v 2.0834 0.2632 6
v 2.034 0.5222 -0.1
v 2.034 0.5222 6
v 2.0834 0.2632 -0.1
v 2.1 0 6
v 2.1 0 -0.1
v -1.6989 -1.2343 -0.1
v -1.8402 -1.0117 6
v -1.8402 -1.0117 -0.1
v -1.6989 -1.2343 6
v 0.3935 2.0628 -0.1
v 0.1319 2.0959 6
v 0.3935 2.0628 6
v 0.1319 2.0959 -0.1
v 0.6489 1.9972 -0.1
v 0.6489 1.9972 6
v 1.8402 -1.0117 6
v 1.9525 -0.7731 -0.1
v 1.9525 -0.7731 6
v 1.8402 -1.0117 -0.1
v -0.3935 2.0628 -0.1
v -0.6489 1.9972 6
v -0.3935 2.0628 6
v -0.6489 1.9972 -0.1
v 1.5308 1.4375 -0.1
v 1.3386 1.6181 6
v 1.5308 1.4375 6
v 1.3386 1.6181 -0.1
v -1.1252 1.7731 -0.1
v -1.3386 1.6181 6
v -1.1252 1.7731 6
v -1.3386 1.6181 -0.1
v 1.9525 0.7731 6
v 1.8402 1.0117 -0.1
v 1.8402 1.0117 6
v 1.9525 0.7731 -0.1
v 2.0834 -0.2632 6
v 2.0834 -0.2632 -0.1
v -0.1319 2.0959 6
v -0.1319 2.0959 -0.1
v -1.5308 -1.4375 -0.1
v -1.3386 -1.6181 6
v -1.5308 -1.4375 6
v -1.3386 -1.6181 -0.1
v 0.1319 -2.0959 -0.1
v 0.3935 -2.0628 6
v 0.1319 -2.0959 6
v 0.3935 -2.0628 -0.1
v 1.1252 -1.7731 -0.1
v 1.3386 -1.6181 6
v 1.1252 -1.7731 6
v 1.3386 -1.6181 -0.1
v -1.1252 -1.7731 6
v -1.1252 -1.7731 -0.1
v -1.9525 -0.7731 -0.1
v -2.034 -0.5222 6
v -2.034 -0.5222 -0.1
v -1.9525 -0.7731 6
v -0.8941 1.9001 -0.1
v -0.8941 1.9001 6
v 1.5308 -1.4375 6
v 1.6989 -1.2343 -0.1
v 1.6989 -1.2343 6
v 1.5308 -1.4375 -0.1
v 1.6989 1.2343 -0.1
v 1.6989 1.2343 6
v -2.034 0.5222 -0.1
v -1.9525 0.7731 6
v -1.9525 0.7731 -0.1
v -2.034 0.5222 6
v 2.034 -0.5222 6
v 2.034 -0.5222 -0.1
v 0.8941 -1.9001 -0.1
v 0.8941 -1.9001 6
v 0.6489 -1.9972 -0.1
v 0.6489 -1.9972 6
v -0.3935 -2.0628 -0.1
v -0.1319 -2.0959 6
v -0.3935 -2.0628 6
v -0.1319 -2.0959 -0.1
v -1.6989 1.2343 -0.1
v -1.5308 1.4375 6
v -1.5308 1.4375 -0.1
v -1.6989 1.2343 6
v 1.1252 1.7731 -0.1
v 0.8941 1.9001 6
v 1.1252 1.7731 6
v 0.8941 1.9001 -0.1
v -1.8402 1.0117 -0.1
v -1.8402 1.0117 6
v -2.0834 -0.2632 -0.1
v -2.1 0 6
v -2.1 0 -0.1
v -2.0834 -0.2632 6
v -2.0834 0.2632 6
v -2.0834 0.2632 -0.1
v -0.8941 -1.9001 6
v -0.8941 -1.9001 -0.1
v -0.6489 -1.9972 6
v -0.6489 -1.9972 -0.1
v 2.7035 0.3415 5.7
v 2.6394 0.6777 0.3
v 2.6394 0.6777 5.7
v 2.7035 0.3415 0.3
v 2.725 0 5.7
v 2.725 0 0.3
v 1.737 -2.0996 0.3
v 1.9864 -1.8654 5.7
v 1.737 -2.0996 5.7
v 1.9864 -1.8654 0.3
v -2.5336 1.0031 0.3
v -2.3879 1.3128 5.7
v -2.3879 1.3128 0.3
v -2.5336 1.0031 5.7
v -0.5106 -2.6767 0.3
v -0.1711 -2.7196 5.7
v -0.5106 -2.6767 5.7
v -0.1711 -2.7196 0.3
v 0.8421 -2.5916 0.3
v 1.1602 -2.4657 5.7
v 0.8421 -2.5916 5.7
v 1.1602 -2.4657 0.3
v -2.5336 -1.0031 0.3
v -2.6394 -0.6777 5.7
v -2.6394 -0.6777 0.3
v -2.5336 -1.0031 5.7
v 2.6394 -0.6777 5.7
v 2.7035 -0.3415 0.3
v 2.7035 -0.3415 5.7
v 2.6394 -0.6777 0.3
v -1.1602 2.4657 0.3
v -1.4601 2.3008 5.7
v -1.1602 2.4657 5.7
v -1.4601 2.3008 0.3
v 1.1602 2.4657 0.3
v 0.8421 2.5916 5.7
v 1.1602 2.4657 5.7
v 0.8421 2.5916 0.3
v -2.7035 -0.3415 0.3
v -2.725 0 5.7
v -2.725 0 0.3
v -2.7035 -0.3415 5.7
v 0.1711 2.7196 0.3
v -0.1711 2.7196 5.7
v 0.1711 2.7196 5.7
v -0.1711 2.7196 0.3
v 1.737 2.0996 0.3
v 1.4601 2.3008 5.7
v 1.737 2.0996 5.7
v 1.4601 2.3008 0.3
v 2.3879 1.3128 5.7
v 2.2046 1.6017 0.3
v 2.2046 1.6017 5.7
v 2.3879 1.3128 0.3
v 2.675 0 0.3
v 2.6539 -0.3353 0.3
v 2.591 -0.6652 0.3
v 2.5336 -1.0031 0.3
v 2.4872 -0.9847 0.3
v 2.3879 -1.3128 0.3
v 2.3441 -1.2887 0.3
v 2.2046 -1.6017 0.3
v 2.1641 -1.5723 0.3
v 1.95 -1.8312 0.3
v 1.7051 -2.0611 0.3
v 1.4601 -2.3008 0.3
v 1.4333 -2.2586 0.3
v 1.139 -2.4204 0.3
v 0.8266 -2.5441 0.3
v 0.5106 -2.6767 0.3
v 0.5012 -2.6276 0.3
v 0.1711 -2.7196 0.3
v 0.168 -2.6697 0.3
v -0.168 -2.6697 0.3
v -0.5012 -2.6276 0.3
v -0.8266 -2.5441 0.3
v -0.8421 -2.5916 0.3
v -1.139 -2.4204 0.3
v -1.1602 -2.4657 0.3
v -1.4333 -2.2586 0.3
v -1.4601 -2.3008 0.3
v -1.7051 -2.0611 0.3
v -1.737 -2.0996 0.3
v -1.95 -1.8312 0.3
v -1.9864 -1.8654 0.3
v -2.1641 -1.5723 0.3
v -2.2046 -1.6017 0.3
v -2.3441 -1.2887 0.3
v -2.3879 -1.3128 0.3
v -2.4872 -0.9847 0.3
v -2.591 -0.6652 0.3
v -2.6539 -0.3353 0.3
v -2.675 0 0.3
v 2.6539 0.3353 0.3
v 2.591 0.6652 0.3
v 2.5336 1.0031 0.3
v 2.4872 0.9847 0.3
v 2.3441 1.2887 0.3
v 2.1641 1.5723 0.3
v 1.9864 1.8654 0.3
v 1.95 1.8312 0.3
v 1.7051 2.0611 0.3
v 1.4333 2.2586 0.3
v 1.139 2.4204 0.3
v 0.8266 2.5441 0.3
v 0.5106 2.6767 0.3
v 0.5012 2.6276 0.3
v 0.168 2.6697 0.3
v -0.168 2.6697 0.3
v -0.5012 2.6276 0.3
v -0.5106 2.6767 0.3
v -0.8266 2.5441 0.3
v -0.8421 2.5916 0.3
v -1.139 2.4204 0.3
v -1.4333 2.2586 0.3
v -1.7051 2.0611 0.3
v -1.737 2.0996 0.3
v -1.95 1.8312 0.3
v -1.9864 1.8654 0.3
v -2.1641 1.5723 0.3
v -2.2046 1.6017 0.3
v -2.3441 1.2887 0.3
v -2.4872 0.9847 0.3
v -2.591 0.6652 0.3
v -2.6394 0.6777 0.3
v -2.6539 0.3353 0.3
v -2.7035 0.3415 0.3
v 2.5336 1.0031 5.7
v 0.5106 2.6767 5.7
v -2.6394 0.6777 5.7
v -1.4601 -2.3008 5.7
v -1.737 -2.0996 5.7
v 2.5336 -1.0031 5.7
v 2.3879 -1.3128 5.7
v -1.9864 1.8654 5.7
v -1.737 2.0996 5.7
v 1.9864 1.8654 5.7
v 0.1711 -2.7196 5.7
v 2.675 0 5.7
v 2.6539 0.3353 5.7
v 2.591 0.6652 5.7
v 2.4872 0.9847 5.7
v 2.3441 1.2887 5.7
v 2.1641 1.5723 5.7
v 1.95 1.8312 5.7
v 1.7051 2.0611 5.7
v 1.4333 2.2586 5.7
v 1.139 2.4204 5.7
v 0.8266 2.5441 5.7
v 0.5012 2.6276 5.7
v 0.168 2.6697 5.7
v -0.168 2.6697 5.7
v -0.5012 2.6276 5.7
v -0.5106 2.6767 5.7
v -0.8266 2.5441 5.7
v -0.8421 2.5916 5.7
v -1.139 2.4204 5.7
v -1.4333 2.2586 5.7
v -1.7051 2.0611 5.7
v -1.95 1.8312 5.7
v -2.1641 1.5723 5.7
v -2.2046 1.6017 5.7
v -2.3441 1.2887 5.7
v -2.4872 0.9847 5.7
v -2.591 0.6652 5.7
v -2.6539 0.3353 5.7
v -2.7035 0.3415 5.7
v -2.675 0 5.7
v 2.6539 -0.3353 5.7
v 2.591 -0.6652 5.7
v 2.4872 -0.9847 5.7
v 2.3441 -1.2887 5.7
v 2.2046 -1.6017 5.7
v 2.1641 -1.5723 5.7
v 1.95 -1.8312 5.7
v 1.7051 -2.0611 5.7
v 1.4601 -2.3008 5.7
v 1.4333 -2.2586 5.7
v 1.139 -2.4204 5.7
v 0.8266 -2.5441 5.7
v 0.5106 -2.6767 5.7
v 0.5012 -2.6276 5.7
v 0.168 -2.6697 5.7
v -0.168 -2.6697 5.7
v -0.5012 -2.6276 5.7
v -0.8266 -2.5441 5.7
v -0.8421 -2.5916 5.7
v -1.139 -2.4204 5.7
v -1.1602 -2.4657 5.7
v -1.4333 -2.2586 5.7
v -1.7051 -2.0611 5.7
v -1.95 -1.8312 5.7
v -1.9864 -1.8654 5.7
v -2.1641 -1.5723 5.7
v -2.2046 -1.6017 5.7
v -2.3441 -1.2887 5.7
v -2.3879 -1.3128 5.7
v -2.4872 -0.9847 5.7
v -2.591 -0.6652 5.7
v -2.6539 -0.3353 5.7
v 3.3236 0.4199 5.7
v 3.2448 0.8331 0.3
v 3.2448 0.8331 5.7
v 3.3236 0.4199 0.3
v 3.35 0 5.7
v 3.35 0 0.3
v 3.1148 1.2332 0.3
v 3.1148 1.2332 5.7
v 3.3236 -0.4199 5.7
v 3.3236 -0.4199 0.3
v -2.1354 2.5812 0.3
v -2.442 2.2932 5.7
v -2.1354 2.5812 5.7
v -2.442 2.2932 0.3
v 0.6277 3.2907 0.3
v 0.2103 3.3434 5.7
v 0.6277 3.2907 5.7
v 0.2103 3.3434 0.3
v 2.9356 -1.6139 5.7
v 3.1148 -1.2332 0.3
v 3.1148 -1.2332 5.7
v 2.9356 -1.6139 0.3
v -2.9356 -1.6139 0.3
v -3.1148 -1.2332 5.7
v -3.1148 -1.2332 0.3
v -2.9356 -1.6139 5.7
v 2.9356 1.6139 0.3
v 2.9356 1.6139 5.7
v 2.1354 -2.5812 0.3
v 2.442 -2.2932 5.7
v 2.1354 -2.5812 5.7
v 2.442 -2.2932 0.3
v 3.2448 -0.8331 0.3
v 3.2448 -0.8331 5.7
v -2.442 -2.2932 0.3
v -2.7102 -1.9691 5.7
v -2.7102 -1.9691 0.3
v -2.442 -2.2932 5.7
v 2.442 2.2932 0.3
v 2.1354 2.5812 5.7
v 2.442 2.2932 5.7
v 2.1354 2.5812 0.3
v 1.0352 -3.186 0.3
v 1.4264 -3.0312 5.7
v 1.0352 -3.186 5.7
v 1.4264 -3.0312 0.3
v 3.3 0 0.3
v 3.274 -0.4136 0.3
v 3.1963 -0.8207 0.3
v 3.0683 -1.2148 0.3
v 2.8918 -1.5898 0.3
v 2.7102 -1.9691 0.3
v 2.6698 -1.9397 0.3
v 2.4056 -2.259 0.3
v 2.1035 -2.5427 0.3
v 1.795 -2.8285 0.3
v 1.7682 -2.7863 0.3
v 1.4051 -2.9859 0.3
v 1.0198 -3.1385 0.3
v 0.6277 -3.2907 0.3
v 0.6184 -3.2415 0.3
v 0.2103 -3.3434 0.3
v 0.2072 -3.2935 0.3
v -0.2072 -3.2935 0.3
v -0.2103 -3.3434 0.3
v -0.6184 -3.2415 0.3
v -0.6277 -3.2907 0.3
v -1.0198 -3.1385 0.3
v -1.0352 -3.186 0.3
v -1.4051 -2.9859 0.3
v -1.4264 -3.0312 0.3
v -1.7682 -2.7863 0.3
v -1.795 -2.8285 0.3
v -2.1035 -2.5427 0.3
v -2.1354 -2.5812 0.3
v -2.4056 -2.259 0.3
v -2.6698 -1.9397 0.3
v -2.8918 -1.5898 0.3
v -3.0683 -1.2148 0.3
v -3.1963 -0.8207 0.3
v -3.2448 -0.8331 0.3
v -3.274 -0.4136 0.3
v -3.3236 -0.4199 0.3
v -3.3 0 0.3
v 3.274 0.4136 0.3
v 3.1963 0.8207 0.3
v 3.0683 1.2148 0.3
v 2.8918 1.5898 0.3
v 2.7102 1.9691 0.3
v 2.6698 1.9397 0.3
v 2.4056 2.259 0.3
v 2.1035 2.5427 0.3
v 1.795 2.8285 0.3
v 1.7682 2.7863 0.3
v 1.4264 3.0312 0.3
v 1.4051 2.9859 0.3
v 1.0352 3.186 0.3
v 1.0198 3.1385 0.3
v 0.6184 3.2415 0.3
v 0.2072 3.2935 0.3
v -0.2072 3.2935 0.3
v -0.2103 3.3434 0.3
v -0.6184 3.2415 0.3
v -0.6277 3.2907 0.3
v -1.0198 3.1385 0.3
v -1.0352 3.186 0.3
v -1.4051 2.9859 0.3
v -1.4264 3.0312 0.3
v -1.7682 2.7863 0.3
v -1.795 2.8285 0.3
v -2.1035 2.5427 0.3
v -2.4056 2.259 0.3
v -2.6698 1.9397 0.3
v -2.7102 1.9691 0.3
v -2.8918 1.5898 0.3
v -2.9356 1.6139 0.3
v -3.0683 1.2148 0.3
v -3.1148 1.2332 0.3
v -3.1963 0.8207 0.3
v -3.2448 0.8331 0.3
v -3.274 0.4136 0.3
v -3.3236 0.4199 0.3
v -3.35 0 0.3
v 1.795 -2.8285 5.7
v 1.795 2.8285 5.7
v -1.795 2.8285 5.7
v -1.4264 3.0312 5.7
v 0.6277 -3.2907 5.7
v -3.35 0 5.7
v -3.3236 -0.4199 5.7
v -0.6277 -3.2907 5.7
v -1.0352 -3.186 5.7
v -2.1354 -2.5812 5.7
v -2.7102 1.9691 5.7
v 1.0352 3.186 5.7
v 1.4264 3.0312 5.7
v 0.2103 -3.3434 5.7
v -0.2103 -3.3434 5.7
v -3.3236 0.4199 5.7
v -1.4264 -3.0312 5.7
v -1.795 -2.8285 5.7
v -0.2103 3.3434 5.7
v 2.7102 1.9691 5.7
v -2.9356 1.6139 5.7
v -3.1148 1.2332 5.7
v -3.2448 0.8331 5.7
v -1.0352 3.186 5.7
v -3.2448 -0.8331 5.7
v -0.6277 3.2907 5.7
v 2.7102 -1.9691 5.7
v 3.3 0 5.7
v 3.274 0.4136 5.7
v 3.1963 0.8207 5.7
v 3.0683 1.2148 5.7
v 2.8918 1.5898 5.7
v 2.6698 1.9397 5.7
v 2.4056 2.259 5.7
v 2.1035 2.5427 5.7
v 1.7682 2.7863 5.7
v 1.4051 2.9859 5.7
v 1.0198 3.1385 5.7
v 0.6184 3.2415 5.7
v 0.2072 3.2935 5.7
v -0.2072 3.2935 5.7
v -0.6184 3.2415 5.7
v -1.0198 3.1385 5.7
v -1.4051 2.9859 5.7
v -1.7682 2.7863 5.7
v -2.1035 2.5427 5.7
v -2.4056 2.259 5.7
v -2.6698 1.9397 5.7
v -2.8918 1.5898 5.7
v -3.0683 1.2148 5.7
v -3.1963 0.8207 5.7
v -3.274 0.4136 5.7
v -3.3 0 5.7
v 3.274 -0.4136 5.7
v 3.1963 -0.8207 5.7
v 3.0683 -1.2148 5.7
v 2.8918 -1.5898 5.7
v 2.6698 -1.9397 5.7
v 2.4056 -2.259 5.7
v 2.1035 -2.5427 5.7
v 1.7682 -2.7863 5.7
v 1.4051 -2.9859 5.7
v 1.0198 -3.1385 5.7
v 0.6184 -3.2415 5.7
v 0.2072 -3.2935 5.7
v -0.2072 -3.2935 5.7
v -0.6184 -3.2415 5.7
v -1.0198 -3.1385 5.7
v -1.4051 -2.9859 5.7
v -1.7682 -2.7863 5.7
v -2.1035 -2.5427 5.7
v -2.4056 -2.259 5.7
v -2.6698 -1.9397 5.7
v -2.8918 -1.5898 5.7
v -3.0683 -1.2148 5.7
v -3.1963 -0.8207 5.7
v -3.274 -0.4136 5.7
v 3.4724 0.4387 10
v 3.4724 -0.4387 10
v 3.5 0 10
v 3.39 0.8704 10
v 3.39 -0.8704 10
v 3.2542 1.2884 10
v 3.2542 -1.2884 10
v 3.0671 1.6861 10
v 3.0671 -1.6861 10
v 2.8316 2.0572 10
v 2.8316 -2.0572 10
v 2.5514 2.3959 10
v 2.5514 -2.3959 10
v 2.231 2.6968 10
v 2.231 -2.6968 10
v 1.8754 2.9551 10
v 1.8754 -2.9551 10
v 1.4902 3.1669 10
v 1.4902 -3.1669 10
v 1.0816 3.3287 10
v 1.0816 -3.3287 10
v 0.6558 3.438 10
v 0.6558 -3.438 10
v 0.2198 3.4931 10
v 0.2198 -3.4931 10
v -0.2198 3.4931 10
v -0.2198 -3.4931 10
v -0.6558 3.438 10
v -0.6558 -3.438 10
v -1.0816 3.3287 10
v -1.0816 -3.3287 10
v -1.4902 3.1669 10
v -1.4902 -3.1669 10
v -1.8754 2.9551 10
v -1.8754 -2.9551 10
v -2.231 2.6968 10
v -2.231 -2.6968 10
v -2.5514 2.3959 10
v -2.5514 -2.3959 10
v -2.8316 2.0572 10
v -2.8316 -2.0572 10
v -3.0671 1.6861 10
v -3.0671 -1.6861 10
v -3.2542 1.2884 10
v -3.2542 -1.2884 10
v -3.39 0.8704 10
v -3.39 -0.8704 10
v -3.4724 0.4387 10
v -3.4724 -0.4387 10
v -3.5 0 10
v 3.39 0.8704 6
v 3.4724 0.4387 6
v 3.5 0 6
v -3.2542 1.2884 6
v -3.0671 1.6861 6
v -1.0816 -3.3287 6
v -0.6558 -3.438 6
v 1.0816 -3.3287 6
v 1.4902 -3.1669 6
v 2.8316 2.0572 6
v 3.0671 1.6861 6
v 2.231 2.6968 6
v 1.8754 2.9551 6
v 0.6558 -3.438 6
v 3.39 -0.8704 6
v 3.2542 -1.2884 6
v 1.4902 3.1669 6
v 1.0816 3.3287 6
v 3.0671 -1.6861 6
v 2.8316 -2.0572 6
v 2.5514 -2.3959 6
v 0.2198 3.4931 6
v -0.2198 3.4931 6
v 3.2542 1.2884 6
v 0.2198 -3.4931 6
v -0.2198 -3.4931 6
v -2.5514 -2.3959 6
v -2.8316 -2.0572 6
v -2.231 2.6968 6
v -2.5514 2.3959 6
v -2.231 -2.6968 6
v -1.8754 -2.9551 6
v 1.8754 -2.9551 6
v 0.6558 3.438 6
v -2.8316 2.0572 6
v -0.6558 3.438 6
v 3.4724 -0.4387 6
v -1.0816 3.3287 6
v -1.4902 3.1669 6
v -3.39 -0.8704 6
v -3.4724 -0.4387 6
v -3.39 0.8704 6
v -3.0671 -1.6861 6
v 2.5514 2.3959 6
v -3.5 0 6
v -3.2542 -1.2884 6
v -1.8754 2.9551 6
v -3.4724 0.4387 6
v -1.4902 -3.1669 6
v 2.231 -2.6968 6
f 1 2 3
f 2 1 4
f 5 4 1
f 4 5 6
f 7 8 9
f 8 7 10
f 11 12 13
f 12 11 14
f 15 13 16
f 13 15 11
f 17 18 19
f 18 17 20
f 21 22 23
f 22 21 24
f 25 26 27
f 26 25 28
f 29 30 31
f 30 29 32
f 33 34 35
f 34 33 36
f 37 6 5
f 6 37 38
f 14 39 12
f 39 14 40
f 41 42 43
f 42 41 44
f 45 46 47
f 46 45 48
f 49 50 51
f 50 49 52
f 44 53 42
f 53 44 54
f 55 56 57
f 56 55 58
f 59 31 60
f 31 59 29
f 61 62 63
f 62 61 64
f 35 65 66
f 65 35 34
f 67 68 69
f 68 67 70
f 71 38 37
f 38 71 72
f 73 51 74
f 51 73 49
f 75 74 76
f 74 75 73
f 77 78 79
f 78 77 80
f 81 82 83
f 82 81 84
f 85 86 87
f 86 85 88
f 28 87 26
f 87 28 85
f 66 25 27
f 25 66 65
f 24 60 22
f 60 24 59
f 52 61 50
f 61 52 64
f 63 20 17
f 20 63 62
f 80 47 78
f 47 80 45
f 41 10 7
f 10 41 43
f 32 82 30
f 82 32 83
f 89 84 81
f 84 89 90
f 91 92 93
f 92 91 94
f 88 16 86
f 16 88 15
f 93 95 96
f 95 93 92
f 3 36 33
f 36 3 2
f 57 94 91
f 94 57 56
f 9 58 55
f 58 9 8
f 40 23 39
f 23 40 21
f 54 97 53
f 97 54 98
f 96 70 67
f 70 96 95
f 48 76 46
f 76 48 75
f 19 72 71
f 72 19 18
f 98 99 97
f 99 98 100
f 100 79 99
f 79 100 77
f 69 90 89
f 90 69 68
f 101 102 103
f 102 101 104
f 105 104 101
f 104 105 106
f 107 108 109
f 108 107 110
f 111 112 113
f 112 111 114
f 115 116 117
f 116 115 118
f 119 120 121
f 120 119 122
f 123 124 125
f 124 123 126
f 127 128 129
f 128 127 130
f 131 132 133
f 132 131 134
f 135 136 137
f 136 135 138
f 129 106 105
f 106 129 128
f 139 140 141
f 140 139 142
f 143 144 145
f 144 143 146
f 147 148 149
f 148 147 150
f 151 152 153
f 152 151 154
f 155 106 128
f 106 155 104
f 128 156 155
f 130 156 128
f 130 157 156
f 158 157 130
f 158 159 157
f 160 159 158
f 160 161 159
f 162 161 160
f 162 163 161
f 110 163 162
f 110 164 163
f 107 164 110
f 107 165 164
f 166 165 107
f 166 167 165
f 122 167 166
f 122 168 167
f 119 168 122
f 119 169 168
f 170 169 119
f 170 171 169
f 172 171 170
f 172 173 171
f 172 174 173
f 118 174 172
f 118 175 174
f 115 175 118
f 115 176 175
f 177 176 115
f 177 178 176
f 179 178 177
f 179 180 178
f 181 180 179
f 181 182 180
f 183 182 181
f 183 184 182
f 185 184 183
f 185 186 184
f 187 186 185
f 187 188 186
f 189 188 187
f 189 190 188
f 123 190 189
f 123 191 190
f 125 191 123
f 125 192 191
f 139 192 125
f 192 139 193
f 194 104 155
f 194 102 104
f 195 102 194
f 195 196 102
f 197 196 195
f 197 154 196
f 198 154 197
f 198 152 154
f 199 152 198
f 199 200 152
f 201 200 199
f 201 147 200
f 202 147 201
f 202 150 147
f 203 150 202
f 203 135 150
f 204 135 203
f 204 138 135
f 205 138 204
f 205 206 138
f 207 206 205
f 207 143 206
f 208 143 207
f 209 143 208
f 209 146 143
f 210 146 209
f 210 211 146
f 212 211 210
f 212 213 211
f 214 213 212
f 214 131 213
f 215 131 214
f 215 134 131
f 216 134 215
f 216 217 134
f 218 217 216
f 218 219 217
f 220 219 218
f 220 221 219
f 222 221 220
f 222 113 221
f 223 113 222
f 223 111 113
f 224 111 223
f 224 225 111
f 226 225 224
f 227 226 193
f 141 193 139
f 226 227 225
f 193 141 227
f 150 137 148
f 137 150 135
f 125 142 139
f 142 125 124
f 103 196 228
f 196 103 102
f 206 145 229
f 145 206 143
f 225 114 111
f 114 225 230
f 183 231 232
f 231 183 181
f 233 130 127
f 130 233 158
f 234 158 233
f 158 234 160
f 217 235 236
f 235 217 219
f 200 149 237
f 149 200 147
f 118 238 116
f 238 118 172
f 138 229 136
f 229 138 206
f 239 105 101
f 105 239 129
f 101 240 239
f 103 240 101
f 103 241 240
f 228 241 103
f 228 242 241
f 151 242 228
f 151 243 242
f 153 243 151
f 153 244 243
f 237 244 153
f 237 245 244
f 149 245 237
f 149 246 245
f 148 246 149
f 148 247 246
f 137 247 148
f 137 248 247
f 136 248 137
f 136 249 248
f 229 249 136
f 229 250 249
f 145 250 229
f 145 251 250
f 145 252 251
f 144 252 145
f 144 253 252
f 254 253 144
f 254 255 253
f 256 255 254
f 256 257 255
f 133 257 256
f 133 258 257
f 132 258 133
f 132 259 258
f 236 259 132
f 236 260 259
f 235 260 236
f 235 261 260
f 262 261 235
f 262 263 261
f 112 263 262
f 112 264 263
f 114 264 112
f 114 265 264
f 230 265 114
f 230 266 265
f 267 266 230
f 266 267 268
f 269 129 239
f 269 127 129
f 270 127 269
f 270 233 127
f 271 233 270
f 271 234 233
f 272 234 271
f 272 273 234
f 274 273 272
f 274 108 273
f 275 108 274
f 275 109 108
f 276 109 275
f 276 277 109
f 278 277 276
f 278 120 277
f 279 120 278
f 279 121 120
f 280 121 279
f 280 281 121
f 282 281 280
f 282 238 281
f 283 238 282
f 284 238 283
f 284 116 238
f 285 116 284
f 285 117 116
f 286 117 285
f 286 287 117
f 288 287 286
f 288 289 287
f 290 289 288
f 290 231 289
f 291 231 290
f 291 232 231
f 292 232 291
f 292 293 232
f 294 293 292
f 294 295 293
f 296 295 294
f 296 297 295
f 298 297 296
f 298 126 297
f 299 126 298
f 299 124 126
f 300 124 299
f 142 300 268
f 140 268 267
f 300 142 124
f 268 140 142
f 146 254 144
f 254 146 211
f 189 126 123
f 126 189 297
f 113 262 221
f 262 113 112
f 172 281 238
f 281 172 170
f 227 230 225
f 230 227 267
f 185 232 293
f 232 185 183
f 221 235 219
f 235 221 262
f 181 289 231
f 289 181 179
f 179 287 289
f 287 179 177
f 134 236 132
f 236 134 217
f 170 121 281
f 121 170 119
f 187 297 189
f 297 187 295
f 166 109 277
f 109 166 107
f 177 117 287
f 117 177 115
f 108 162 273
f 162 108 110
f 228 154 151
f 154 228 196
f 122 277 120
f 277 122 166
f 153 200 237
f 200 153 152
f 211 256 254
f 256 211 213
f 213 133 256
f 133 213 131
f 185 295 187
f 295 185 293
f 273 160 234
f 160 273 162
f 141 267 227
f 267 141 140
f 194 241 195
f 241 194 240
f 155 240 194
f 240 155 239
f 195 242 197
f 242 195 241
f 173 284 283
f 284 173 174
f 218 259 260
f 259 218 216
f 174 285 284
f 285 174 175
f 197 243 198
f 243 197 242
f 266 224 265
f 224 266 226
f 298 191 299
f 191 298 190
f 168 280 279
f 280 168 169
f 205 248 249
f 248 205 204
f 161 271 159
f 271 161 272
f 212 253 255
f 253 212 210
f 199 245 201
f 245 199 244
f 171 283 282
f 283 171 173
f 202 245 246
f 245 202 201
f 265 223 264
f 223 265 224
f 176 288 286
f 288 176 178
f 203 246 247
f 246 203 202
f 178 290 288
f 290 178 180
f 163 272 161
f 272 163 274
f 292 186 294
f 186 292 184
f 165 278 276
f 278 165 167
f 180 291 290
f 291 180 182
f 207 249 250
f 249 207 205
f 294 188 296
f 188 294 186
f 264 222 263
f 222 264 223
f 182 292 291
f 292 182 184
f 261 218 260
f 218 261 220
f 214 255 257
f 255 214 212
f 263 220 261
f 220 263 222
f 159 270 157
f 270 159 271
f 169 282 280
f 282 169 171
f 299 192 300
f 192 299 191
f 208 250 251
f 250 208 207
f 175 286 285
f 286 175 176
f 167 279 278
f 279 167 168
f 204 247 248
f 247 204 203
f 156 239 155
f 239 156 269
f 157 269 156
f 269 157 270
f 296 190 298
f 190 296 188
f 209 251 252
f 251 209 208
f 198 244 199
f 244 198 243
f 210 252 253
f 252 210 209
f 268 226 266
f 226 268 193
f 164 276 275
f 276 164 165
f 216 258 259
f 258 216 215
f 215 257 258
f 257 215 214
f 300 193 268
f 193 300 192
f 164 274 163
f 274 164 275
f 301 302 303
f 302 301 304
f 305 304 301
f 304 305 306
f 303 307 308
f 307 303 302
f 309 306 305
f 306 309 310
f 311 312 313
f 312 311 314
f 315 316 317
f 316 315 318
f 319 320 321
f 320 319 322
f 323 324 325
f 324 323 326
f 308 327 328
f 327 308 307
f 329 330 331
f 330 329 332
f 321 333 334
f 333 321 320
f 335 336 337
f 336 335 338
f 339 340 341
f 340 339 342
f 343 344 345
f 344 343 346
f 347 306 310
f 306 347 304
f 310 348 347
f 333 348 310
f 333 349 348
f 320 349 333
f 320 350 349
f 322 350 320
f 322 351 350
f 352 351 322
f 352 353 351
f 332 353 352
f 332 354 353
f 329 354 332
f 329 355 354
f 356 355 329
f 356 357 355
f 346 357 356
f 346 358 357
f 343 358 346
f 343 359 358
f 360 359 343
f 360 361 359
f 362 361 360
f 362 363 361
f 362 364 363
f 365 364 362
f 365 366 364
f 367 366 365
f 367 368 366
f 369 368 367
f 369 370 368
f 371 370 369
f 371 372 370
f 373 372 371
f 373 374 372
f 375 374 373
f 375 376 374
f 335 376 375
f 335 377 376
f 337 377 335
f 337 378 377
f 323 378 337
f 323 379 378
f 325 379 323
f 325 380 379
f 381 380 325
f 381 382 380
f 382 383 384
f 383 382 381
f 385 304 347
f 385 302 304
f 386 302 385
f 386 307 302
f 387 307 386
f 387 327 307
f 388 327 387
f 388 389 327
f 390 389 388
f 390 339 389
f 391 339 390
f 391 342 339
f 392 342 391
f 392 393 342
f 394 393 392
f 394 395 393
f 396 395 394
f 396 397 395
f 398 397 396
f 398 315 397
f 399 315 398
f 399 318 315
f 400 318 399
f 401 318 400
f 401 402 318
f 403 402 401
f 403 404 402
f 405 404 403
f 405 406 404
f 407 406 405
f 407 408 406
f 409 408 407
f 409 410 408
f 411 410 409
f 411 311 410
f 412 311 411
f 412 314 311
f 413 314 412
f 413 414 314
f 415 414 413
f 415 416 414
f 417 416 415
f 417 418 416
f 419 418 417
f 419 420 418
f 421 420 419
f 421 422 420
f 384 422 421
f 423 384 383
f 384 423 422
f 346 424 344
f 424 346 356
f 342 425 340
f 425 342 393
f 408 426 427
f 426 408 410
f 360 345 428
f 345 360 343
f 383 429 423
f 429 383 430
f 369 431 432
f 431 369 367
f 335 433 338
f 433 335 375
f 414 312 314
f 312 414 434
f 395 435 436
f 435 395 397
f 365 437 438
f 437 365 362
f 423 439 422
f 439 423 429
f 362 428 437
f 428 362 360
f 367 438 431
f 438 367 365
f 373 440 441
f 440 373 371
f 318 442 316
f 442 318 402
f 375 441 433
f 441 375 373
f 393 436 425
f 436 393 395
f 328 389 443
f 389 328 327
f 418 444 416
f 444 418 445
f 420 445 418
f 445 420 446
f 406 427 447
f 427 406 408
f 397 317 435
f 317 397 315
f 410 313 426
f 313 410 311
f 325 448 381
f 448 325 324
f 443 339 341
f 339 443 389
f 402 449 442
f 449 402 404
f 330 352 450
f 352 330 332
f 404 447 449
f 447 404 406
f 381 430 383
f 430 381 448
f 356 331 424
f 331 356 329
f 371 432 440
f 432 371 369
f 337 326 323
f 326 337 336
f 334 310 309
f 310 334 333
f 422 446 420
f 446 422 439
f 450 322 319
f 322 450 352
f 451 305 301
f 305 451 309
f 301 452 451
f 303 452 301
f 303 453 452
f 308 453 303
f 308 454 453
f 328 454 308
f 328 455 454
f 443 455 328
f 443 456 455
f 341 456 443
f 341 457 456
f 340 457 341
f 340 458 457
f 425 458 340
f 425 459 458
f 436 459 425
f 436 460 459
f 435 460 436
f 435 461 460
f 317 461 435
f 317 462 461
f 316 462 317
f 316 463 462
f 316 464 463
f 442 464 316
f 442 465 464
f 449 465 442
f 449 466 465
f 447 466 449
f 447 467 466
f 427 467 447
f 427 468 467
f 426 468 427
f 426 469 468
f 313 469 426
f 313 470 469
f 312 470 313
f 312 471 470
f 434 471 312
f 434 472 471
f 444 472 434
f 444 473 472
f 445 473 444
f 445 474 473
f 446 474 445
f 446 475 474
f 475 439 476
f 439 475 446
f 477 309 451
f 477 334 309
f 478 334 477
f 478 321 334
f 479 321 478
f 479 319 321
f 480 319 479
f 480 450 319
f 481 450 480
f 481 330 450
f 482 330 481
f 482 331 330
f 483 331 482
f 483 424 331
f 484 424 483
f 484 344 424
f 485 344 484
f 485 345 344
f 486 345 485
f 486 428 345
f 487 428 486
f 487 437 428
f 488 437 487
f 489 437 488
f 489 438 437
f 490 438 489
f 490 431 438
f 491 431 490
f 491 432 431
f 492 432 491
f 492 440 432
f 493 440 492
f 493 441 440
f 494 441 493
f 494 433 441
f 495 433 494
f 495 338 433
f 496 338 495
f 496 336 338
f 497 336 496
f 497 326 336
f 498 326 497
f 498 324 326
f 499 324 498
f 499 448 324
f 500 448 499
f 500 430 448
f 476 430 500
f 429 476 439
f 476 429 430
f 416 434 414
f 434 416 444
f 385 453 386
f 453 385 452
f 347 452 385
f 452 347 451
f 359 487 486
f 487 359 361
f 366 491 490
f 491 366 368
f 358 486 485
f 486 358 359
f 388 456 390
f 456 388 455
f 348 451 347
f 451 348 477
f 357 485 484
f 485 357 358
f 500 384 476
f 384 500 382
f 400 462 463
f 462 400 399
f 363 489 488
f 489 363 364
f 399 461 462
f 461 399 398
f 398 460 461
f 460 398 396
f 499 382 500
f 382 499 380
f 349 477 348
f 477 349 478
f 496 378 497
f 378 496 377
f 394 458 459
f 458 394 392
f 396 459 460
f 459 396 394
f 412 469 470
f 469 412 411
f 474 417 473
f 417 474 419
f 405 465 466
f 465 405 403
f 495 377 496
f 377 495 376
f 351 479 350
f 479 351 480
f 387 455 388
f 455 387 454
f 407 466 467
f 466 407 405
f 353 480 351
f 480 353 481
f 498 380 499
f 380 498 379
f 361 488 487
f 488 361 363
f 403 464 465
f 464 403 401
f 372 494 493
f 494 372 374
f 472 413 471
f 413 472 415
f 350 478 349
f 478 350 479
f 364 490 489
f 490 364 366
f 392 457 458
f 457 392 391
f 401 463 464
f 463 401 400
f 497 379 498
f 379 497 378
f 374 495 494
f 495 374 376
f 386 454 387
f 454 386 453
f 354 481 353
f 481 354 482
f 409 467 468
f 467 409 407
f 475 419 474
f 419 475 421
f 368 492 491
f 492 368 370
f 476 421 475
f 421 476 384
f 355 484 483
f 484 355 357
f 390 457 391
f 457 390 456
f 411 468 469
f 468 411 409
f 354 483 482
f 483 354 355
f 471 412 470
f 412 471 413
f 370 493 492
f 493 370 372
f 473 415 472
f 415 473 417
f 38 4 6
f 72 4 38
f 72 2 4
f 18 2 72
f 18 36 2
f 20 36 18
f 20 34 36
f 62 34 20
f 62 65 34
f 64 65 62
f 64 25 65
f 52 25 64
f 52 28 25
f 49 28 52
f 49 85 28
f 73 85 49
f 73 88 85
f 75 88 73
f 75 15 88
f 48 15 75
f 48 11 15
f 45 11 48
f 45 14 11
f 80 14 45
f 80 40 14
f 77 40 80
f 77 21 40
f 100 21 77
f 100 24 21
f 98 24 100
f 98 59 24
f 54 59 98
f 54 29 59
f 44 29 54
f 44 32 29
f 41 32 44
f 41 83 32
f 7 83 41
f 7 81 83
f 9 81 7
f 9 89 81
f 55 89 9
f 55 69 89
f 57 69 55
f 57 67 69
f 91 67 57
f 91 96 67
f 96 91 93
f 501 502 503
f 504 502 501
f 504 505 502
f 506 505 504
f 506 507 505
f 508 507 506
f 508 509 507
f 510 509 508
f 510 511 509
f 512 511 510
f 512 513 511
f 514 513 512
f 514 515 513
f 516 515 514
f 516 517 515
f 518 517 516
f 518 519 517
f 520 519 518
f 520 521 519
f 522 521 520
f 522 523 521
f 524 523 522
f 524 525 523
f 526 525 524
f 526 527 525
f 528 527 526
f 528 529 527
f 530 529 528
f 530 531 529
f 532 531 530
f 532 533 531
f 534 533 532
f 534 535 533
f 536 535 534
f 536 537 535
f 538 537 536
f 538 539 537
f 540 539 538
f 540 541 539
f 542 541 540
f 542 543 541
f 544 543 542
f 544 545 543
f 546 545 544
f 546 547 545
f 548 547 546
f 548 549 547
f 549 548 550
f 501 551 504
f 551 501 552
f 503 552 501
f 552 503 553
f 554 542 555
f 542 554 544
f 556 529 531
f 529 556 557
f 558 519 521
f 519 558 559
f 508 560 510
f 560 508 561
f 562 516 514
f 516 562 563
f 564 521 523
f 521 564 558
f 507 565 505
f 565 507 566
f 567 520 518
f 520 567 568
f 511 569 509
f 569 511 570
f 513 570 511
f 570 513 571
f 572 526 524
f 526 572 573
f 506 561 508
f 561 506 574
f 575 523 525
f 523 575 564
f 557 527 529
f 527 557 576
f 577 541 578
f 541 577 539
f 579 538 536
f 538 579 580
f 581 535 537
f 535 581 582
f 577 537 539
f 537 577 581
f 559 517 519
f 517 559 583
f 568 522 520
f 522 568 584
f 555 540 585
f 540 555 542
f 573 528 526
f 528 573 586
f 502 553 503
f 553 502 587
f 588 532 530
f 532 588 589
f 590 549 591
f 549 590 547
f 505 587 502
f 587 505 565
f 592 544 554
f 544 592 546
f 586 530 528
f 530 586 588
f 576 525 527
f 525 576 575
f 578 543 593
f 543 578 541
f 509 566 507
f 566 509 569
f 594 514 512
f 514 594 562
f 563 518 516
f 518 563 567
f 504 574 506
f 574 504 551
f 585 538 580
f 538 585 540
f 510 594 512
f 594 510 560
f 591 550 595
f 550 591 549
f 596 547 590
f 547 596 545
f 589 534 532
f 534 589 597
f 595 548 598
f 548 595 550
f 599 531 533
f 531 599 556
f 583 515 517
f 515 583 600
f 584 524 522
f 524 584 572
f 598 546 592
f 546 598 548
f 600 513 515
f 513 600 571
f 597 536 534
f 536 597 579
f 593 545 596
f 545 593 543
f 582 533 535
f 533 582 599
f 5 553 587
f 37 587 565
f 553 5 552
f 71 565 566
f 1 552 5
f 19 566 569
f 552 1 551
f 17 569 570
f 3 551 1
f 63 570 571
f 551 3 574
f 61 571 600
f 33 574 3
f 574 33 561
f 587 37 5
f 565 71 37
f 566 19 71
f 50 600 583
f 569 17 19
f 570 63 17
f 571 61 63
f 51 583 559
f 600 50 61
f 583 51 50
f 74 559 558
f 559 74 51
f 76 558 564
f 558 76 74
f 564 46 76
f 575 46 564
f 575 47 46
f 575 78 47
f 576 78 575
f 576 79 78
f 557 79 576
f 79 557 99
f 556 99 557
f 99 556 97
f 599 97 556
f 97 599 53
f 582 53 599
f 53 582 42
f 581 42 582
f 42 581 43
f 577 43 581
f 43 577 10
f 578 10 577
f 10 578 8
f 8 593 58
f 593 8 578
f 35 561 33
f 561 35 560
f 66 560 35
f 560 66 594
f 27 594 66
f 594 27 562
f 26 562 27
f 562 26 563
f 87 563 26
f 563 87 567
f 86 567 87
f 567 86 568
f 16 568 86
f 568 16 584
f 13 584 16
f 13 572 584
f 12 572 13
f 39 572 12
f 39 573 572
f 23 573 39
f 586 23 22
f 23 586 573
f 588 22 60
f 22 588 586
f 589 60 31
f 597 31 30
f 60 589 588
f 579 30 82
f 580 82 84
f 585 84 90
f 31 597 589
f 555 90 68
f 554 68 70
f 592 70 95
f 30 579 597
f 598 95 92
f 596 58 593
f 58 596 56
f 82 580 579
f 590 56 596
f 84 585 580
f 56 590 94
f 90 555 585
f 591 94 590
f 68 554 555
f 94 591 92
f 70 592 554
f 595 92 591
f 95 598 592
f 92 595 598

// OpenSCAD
module screw_hole(d=5.5, head_d=16,       // screw body and head diameters
                  l=8,                    // screw body length
                  total_l=10,             // total length incl head pit
                  concentric_cracks=true, // with reinforcement cracks
                  concentric_step=.625,   // cracks spacing
                  first_layer=.3,         // bottom layers before reinforcement cracks
                  last_layer=.3,          // top layer after reinforcement cracks
                  bore_through=.1,        // extra body depth
                  $fn=50) {
    
    // central hole
    translate([0, 0, -bore_through])
    cylinder(d=d, h=total_l + bore_through);

    // head
    translate([0, 0, l])
    cylinder(d=head_d, h=total_l-l, $fn=$fn);

    // concentric reinforcement cracks
    if (concentric_cracks) for (d=[d:concentric_step*2:head_d]) {
        difference() {
            translate([0, 0, first_layer])
            cylinder(d=d, h=l - first_layer - last_layer, $fn=$fn);
            cylinder(d=d-.1, h=total_l*3, center=true, $fn=$fn);
        }
    }
    
    // todo: star cracks
}

!screw_hole(4.2, 7, 6, 10);
